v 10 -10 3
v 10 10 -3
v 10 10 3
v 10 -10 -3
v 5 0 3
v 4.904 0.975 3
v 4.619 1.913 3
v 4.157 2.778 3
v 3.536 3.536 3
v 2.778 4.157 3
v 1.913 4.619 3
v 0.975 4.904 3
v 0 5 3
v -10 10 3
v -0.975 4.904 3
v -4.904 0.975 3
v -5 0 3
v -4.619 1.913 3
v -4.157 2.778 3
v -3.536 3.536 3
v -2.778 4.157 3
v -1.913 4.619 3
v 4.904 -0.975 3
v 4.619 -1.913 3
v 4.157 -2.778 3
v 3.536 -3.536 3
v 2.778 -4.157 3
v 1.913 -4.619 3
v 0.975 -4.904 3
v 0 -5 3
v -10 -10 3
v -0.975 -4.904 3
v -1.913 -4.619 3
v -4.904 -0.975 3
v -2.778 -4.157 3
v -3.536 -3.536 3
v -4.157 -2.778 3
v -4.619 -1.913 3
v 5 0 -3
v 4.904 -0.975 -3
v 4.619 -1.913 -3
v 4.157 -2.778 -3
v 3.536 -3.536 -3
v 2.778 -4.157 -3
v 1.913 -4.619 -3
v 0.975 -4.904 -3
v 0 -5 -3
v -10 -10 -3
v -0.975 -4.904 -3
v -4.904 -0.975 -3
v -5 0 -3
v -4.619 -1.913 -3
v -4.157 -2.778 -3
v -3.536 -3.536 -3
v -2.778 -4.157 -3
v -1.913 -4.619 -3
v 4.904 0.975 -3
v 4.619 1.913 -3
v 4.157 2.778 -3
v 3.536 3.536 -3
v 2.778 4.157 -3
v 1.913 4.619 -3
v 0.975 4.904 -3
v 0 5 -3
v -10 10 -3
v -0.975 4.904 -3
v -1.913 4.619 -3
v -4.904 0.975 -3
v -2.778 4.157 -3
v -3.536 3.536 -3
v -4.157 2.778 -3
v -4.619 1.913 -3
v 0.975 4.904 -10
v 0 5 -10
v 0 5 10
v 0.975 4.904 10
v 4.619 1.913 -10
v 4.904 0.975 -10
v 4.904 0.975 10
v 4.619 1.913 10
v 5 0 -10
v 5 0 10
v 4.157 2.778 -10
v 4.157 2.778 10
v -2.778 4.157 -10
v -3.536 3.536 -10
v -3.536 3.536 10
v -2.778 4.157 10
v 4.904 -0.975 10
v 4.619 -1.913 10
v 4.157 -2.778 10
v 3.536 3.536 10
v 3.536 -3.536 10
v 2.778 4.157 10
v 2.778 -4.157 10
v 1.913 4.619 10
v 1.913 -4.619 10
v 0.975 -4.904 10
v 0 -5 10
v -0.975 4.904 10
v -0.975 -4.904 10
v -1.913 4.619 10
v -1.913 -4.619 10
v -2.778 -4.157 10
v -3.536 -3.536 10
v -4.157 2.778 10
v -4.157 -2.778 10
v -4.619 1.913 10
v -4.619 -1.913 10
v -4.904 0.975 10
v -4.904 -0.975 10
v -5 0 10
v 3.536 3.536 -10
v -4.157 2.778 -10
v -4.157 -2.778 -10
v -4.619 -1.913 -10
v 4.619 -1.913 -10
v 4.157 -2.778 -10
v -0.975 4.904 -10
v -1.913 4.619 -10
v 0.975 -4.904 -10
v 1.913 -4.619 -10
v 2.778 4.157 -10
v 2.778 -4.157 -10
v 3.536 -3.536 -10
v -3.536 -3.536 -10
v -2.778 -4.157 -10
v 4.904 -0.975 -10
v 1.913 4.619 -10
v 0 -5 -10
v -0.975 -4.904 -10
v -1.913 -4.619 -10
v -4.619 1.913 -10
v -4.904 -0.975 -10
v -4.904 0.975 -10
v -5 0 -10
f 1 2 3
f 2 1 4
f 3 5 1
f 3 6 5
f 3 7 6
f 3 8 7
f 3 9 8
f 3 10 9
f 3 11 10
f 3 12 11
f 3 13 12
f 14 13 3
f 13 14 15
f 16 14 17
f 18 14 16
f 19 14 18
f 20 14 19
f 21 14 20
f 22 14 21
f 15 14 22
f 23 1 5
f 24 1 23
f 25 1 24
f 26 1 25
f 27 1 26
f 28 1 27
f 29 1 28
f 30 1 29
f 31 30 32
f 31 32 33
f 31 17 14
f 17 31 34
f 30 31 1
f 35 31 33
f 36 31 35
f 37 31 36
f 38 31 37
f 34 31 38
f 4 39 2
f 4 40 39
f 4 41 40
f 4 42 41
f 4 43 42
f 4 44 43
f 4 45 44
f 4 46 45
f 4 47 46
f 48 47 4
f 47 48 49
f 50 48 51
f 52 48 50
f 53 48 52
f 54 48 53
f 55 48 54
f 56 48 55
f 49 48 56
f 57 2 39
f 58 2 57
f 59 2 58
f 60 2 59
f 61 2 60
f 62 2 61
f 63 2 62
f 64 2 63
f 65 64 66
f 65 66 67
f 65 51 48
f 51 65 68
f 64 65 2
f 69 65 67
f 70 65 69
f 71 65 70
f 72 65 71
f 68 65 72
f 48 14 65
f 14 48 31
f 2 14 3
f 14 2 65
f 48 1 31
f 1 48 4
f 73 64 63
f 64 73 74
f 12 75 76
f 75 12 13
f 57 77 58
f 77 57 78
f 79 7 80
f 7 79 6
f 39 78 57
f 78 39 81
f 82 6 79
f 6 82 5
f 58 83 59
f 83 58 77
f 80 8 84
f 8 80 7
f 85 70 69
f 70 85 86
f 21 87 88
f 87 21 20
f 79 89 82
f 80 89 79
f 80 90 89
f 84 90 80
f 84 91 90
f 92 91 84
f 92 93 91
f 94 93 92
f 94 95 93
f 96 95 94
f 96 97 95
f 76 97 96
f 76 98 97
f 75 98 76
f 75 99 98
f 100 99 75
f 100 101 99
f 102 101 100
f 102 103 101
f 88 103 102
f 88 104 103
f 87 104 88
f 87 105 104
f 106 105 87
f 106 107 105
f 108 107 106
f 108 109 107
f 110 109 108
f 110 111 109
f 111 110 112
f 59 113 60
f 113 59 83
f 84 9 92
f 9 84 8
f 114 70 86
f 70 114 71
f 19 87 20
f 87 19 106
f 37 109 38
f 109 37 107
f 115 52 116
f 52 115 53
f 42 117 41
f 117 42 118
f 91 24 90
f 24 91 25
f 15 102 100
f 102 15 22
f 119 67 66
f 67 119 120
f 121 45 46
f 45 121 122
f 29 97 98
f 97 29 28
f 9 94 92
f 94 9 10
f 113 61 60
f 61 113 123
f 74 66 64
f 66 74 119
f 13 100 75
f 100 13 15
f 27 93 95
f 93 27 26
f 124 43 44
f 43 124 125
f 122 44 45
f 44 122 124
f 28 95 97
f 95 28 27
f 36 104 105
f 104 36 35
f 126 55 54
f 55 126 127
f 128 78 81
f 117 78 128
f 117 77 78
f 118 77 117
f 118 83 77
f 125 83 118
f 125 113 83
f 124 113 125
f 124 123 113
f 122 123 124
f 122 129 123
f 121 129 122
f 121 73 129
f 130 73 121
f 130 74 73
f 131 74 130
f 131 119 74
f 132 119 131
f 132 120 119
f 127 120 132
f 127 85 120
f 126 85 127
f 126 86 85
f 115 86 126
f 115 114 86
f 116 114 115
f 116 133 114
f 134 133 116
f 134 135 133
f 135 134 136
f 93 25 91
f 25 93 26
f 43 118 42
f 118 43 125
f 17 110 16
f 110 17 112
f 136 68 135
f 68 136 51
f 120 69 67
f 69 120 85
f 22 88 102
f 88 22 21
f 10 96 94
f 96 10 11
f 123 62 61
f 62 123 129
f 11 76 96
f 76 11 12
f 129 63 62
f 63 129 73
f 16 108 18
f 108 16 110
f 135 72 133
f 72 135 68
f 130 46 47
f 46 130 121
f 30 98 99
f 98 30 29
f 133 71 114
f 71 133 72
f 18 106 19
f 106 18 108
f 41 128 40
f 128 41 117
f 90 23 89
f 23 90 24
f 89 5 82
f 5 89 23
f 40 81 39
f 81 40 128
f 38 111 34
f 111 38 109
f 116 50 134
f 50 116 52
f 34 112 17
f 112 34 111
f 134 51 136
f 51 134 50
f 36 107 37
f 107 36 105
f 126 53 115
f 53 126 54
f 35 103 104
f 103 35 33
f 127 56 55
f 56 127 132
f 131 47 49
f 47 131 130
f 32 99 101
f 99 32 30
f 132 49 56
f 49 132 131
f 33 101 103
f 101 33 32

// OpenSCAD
union() {
  cube([20, 20, 6], center = true);
  cylinder(h = 20, r = 5, center = true, $fn = 32);
}
